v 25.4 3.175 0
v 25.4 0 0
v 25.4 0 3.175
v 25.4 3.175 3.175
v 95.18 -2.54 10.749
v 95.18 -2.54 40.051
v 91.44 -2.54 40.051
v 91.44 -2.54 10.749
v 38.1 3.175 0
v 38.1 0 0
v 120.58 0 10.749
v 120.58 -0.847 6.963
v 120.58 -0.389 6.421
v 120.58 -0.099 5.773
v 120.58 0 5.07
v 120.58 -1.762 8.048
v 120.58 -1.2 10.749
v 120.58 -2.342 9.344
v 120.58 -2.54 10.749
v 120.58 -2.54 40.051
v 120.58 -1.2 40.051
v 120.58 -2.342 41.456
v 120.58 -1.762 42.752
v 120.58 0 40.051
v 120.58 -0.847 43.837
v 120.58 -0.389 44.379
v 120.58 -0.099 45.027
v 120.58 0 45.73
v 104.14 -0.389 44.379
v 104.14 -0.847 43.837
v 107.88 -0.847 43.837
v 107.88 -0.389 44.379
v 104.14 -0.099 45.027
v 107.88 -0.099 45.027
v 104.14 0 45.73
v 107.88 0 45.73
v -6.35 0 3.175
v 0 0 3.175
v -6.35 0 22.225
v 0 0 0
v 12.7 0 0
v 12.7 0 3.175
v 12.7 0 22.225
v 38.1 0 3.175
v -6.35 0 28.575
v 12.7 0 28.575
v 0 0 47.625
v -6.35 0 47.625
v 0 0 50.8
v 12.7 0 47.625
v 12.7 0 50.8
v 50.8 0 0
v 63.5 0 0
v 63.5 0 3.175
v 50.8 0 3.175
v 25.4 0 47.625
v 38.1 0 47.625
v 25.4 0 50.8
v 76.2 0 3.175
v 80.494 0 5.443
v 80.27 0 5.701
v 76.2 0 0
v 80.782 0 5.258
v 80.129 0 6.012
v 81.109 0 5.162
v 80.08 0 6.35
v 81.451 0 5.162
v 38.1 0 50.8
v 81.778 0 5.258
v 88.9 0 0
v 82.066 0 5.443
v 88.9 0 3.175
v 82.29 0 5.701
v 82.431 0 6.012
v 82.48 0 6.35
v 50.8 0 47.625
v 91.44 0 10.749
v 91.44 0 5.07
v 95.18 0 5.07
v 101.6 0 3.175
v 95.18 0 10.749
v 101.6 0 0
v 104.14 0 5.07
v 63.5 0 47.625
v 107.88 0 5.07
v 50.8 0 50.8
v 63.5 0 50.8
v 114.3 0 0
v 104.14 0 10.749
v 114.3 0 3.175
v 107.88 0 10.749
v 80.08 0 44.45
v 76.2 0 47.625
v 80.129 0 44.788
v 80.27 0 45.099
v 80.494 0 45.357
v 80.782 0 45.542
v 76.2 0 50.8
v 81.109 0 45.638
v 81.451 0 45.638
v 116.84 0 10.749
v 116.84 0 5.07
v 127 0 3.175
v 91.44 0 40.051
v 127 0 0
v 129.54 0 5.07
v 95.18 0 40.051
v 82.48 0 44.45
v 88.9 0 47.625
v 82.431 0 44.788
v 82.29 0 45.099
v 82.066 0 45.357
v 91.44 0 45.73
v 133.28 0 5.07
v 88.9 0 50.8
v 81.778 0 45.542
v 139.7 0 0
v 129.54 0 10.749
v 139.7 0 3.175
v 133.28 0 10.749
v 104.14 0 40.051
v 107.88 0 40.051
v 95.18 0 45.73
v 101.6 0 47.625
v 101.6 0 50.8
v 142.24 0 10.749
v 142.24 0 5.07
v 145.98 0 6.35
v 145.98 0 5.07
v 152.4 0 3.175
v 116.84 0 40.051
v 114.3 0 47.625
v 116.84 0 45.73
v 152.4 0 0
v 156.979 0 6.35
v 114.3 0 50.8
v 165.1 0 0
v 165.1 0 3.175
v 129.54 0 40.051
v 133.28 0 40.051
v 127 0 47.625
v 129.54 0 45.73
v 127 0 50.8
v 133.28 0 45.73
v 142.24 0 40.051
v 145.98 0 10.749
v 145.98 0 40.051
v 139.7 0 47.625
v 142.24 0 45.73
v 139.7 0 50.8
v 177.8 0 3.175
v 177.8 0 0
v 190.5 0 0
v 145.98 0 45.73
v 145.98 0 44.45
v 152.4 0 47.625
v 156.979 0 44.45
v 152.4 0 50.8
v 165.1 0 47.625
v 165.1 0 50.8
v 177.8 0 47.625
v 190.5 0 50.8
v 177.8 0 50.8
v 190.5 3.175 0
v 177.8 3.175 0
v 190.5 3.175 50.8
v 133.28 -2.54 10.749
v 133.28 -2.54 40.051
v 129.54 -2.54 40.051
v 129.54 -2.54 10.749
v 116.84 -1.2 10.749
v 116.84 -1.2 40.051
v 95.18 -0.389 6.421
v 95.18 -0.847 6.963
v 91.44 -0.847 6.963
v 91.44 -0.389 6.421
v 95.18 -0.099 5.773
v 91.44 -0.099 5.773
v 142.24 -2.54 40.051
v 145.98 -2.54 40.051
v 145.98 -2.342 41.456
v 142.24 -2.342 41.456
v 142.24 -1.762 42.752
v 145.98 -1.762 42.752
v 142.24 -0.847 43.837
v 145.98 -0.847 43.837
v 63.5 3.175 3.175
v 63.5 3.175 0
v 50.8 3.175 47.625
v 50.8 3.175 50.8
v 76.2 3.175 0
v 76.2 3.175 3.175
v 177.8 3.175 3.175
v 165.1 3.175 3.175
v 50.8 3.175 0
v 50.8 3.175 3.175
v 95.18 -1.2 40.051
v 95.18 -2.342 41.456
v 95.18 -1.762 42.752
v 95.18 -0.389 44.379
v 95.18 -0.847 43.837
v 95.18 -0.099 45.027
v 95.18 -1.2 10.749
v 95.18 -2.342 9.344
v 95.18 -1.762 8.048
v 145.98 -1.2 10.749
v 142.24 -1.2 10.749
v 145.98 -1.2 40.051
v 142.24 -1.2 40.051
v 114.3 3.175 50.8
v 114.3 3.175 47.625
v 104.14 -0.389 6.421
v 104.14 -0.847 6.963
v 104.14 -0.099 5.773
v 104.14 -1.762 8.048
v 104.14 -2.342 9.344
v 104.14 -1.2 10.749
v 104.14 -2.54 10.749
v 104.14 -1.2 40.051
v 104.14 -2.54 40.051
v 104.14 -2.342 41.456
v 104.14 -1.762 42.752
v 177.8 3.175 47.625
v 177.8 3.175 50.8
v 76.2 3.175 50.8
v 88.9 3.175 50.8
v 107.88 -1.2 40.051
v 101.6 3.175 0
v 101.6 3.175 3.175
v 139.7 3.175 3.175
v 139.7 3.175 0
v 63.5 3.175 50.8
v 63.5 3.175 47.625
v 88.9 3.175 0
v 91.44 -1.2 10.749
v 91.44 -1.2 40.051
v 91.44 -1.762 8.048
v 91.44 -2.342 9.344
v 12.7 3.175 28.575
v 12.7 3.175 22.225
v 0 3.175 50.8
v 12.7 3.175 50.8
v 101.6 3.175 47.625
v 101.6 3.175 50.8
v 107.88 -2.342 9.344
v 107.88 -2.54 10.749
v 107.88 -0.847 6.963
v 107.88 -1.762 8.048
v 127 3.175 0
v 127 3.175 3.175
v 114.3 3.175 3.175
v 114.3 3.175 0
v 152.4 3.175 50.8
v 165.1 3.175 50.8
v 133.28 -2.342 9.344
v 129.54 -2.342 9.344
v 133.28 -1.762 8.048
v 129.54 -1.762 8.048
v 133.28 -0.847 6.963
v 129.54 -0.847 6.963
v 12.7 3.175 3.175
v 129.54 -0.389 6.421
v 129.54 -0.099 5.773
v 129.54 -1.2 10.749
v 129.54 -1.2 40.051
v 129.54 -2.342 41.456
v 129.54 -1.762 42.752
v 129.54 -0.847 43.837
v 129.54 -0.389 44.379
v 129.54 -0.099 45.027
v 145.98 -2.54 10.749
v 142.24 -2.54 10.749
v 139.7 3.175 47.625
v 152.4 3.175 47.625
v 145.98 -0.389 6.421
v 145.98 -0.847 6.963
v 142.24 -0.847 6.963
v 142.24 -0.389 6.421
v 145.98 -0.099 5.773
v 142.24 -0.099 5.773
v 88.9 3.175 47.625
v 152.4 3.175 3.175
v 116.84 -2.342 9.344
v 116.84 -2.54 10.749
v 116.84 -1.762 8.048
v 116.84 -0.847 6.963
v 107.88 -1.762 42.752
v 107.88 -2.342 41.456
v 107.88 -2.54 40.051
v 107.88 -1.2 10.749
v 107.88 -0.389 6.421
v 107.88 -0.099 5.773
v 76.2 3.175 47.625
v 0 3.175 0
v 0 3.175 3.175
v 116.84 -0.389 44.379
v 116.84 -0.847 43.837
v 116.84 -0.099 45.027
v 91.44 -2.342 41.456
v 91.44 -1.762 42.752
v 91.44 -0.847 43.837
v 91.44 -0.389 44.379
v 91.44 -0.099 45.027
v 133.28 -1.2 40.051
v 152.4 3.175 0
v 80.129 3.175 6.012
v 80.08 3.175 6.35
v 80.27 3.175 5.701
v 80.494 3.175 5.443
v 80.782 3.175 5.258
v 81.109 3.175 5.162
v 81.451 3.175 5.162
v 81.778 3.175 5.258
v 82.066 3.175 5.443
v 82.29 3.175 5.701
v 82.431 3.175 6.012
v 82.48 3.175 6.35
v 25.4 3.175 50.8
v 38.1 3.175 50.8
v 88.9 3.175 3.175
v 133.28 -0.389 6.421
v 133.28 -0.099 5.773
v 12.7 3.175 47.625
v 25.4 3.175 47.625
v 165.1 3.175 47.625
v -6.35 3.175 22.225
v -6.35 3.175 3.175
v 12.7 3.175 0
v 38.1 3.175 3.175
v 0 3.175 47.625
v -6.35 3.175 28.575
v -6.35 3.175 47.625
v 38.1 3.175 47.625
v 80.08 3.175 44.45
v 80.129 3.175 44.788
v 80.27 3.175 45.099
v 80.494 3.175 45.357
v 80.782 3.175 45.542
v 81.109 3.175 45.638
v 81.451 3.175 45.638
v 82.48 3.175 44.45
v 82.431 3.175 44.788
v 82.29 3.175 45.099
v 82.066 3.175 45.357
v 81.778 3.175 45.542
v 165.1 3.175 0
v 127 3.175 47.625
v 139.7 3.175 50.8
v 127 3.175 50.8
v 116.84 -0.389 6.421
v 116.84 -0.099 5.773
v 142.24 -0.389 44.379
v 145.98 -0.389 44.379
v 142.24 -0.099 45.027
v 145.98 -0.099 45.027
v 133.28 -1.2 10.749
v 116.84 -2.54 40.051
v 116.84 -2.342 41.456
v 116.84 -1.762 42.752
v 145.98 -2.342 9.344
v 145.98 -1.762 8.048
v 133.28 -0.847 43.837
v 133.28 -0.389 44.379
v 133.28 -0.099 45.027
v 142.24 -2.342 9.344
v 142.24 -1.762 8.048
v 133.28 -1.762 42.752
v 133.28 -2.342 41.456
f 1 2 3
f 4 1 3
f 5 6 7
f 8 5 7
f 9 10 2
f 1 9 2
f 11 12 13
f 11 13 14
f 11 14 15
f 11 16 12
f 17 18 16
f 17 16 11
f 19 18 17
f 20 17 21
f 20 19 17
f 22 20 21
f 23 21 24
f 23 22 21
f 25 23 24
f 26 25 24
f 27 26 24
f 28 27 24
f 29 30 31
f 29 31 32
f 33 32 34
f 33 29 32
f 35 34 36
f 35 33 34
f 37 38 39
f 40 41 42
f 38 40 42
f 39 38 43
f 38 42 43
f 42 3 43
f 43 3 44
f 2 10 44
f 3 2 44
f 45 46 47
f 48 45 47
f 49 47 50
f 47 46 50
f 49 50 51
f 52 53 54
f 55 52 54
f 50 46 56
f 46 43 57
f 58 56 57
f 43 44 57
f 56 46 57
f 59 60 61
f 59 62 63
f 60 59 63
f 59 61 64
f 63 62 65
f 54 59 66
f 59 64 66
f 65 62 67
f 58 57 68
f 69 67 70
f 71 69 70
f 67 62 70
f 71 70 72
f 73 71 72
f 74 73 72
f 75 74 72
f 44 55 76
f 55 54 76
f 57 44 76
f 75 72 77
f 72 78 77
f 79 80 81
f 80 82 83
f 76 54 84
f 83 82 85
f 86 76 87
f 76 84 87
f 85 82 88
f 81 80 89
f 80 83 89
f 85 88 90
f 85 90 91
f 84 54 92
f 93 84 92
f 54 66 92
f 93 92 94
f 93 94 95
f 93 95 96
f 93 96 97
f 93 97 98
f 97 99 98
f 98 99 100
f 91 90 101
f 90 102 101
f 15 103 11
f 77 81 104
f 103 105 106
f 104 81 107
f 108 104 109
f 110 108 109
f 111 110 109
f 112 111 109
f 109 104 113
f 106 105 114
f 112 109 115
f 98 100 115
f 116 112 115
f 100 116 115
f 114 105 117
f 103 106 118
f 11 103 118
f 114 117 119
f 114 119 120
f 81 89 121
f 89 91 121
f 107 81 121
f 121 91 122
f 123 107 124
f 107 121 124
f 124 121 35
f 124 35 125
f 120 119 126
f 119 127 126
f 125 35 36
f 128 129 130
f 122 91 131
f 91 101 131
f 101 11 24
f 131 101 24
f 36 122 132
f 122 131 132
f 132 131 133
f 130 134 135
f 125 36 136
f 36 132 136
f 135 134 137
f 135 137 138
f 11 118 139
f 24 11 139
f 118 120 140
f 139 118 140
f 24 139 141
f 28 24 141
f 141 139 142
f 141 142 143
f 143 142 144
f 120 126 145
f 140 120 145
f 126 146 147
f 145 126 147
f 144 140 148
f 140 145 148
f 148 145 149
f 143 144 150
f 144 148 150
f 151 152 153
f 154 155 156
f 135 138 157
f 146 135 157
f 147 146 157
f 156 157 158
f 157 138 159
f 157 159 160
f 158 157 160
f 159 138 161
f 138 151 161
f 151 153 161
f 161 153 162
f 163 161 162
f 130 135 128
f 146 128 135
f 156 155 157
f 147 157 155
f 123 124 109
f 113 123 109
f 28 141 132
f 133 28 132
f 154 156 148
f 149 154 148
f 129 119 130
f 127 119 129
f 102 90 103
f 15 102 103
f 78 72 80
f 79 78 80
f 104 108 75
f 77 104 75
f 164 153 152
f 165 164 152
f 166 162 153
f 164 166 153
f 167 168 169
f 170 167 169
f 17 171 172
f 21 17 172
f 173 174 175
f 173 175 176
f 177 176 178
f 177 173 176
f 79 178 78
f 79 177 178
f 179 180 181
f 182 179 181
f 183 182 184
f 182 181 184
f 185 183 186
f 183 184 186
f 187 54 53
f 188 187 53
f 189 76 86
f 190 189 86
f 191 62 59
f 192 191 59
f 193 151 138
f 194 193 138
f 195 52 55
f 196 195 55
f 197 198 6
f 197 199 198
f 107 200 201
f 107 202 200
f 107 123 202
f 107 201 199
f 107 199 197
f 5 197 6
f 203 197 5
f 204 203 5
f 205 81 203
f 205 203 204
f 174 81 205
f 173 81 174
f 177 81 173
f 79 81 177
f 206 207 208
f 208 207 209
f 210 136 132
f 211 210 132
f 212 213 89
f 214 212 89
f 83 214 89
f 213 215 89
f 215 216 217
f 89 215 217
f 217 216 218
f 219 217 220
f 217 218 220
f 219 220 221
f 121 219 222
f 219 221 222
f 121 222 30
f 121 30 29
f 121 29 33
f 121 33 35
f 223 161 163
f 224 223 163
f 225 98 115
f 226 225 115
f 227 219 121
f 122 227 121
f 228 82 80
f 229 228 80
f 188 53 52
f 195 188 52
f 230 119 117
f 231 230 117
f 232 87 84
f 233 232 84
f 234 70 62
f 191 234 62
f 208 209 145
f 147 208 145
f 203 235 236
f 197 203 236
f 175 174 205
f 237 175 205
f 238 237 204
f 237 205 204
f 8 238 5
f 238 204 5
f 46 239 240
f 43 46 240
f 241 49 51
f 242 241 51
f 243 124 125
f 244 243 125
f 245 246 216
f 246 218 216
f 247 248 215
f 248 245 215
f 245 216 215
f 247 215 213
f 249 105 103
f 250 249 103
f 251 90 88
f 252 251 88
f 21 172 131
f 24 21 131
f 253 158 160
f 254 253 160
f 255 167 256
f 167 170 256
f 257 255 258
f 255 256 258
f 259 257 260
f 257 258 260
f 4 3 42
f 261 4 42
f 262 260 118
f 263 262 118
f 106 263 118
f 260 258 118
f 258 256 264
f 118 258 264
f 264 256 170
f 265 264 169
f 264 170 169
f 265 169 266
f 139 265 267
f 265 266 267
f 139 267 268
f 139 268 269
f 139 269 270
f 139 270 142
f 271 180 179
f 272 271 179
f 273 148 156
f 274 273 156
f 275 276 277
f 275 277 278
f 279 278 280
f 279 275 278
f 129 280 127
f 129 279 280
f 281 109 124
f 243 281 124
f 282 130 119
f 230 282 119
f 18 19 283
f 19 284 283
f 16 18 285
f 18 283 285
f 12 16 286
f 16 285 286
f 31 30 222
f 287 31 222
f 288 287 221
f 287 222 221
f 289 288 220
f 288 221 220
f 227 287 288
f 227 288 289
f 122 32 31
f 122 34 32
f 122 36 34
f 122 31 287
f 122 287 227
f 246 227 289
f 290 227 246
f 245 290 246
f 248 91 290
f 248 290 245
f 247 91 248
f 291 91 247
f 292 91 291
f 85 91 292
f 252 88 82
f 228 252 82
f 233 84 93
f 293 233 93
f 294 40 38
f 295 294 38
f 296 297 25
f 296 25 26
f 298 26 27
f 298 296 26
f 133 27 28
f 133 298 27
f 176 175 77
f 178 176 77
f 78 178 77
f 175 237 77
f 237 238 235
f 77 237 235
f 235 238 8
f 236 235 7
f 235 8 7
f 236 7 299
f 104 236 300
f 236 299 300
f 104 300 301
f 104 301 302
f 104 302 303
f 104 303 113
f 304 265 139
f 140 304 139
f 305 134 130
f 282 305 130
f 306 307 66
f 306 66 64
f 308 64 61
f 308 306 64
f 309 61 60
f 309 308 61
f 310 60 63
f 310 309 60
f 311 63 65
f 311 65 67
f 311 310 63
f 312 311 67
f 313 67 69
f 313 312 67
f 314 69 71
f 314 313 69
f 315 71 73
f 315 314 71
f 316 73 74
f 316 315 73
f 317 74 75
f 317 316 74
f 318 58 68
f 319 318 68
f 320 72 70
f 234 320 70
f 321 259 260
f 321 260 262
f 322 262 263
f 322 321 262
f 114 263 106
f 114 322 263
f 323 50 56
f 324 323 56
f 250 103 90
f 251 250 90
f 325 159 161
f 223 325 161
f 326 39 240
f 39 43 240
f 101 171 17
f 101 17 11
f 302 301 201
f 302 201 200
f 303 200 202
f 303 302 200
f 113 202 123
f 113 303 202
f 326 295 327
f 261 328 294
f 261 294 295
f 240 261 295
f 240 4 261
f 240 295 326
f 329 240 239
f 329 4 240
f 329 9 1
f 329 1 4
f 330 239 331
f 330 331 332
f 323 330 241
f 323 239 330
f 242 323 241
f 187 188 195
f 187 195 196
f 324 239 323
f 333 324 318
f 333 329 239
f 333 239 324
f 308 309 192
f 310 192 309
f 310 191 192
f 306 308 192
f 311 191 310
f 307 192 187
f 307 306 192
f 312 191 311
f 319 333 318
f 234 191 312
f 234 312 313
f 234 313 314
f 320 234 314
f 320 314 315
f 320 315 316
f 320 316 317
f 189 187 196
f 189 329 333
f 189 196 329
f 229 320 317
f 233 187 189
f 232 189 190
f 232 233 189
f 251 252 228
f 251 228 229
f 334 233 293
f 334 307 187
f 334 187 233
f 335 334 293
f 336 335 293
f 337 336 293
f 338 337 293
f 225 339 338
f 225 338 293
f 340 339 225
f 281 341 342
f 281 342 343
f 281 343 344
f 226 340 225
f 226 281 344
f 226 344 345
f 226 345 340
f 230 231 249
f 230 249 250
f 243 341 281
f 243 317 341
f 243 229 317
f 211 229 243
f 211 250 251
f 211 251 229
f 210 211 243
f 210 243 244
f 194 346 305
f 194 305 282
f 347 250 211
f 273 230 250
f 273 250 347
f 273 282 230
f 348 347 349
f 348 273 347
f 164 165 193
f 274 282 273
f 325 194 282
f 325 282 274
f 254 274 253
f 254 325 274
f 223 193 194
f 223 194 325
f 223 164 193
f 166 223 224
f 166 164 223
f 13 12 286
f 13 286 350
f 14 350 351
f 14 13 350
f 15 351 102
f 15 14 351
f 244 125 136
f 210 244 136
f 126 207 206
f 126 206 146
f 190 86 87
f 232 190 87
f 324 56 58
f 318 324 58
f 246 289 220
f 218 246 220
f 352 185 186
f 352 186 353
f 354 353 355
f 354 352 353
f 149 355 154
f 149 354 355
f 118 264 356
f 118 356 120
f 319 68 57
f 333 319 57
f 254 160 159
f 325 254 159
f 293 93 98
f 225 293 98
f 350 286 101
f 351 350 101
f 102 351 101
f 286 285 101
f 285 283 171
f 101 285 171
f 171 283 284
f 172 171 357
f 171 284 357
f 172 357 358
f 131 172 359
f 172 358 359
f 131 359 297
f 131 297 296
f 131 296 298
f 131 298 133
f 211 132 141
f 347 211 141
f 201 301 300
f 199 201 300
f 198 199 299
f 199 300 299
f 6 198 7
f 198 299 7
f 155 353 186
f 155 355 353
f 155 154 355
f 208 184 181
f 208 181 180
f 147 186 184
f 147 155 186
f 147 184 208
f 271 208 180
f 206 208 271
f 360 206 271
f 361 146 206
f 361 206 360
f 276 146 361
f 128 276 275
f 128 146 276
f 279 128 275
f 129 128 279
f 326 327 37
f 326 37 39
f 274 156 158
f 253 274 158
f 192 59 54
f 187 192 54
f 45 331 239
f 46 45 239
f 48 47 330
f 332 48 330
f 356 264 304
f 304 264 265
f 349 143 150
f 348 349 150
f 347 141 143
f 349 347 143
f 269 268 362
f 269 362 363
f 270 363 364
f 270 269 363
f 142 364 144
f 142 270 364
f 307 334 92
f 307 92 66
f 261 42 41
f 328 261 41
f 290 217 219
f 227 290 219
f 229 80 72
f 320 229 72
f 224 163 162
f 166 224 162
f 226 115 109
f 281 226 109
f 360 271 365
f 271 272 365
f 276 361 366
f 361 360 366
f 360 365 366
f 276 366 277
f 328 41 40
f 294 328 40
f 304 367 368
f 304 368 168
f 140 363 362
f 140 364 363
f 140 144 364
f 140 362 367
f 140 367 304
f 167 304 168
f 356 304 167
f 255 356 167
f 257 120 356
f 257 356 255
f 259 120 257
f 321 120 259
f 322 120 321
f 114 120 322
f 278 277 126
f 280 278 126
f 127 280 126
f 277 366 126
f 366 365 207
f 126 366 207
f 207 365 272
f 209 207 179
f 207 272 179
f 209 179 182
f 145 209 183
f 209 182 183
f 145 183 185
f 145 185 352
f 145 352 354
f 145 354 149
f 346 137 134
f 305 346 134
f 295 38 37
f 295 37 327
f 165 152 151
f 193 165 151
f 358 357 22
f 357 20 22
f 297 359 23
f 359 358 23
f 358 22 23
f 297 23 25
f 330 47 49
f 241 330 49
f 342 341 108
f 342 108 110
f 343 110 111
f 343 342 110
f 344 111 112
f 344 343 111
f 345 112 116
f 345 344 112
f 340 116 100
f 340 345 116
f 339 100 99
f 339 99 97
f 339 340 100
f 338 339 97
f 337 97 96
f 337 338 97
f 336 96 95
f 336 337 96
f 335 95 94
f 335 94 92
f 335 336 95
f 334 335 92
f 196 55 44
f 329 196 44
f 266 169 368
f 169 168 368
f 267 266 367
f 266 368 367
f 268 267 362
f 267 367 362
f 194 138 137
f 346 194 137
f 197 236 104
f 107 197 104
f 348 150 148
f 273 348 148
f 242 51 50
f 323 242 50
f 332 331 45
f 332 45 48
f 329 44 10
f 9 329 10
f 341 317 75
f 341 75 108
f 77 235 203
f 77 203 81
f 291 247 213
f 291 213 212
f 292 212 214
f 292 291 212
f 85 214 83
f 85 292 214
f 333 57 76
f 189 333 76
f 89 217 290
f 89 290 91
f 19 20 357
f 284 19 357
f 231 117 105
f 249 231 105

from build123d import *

# Parameters (mm, degrees)
BOSS_EXTRUDE1_DEPTH = 3.175
SKETCH2_W           = 12.7
SKETCH2_H           = 6.35
CUT_EXTRUDE1_DEPTH  = 198.182581951
SKETCH3_W           = 19.05
SKETCH3_H           = 3.175
BOSS_EXTRUDE2_DEPTH = 6.35
CUT_EXTRUDE4_DEPTH  = 3.175
SKETCH6_W           = 3.74
SKETCH6_H           = 38.1
BOSS_EXTRUDE3_DEPTH = 2.54
FILLET1_R           = 5.08
CUT_EXTRUDE5_REACH  = 113.371
SKETCH7_W           = 29.301181898
SKETCH7_H           = 1.2
FILLET3_R           = 2.54


with BuildPart() as part:
    # Sketch1 → Boss-Extrude1 (new body)
    with BuildSketch(Plane(origin=(0, 0, 0), x_dir=(1, 0, 0), z_dir=(0, 1, 0))):
        Polygon((12.7, 0), (0, 0), (0, -50.8), (12.7, -50.8), (12.7, -47.625), (25.4, -47.625), (25.4, -50.8), (38.1, -50.8), (38.1, -47.625), (50.8, -47.625), (50.8, -50.8), (63.5, -50.8), (63.5, -47.625), (76.2, -47.625), (76.2, -50.8), (88.9, -50.8), (88.9, -47.625), (101.6, -47.625), (101.6, -50.8), (114.3, -50.8), (114.3, -47.625), (127, -47.625), (127, -50.8), (139.7, -50.8), (139.7, -47.625), (152.4, -47.625), (152.4, -50.8), (165.1, -50.8), (165.1, -47.625), (177.8, -47.625), (177.8, -50.8), (190.5, -50.8), (190.5, 0), (177.8, 0), (177.8, -3.175), (165.1, -3.175), (165.1, 0), (152.4, 0), (152.4, -3.175), (139.7, -3.175), (139.7, 0), (127, 0), (127, -3.175), (114.3, -3.175), (114.3, 0), (101.6, 0), (101.6, -3.175), (88.9, -3.175), (88.9, 0), (76.2, 0), (76.2, -3.175), (63.5, -3.175), (63.5, 0), (50.8, 0), (50.8, -3.175), (38.1, -3.175), (38.1, 0), (25.4, 0), (25.4, -3.175), (12.7, -3.175), align=None)
    extrude(amount=BOSS_EXTRUDE1_DEPTH)

    # Sketch2 → Cut-Extrude1 (cut, through all)
    with BuildSketch(Plane(origin=(0, 3.175, 0), x_dir=(1, 0, 0), z_dir=(0, 1, 0))):
        with Locations((6.35, -25.4)):
            Rectangle(SKETCH2_W, SKETCH2_H)
    extrude(amount=-CUT_EXTRUDE1_DEPTH, mode=Mode.SUBTRACT)

    # Sketch3 → Boss-Extrude2 (add)
    with BuildSketch(Plane.ZY):
        with Locations((12.7, 1.5875)):
            Rectangle(SKETCH3_W, SKETCH3_H)
        with Locations((38.1, 1.5875)):
            Rectangle(SKETCH3_W, SKETCH3_H)
    extrude(amount=BOSS_EXTRUDE2_DEPTH)

    # Sketch5 → Cut-Extrude4 (cut)
    with BuildSketch(Plane(origin=(0, 3.175, 0), x_dir=(1, 0, 0), z_dir=(0, 1, 0))):
        with BuildLine():
            Line((82.48, -6.35), (82.48, -44.45))
            ThreePointArc((82.48, -44.45), (81.28, -45.65), (80.08, -44.45))
            Line((80.08, -44.45), (80.08, -6.35))
            ThreePointArc((80.08, -6.35), (81.28, -5.15), (82.48, -6.35))
        make_face()
    extrude(amount=-CUT_EXTRUDE4_DEPTH, mode=Mode.SUBTRACT)

    # Sketch6 → Boss-Extrude3 (add)
    with BuildSketch(Plane(origin=(0, 0, 0), x_dir=(-1, 0, 0), z_dir=(0, -1, 0))):
        with Locations((-106.01, -25.4)):
            Rectangle(SKETCH6_W, SKETCH6_H)
        with Locations((-93.31, -25.4)):
            Rectangle(SKETCH6_W, SKETCH6_H)
        with Locations((-118.71, -25.4)):
            Rectangle(SKETCH6_W, SKETCH6_H)
        with Locations((-131.41, -25.4)):
            Rectangle(SKETCH6_W, SKETCH6_H)
        with Locations((-144.11, -25.4)):
            Rectangle(SKETCH6_W, SKETCH6_H)
    extrude(amount=BOSS_EXTRUDE3_DEPTH)

    # Fillet1
    # the kernel refuses this fillet: 5.08 mm, written as the material it takes off along each edge
    with BuildSketch(Plane(origin=(106.178522628, -2.54, 6.35), x_dir=(0, 1, 0), z_dir=(-1, 0, 0)), Plane(origin=(80.441477372, -2.54, 44.45), x_dir=(0, 1, 0), z_dir=(1, 0, 0))) as fillet1_piece_1:
        with BuildLine():
            CenterArc((5.08, -4.399409051), FILLET1_R, 120, 60)
            Line((0, -4.399409051), (-0.1016, -4.399409051))
            Line((-0.1016, -4.399409051), (-0.1016, 0))
            Line((-0.1016, 0), (0, 0.1016))
            ThreePointArc((0, 0.1016), (1.27, 0.1016), (2.4892, 0.087988181))
            Line((2.4892, 0.087988181), (2.54, 0))
        make_face()
    extrude(amount=25.737045256, mode=Mode.SUBTRACT)
    with BuildSketch(Plane(origin=(93.141477372, -2.54, 6.35), x_dir=(0, 1, 0), z_dir=(1, 0, 0)), Plane(origin=(105.841477372, -2.54, 6.35), x_dir=(0, 1, 0), z_dir=(1, 0, 0)), Plane(origin=(118.541477372, -2.54, 6.35), x_dir=(0, 1, 0), z_dir=(1, 0, 0)), Plane(origin=(131.241477372, -2.54, 6.35), x_dir=(0, 1, 0), z_dir=(1, 0, 0)), Plane(origin=(156.978522628, -2.54, 44.45), x_dir=(0, 1, 0), z_dir=(-1, 0, 0)), Plane(origin=(144.278522628, -2.54, 44.45), x_dir=(0, 1, 0), z_dir=(-1, 0, 0)), Plane(origin=(131.578522628, -2.54, 44.45), x_dir=(0, 1, 0), z_dir=(-1, 0, 0)), Plane(origin=(118.878522628, -2.54, 44.45), x_dir=(0, 1, 0), z_dir=(-1, 0, 0))) as fillet1_piece_2:
        with BuildLine():
            CenterArc((5.08, 4.399409051), FILLET1_R, 180, 60)
            Line((0, 4.399409051), (-0.1016, 4.399409051))
            Line((-0.1016, 4.399409051), (-0.1016, 0))
            Line((-0.1016, 0), (0, -0.1016))
            ThreePointArc((0, -0.1016), (1.27, -0.1016), (2.4892, -0.087988181))
            Line((2.4892, -0.087988181), (2.54, 0))
        make_face()
    extrude(amount=25.737045256, mode=Mode.SUBTRACT)

    # Cut-Extrude5: up to this face of the body (flat: up to its plane)
    cut_extrude5_end = Plane(part.part.faces().sort_by_distance((145.98, -1.229881831, 25.4))[0])
    # Sketch7 → Cut-Extrude5 (cut, up to the picked face)
    with BuildSketch(Plane.ZY.offset(-91.44), mode=Mode.PRIVATE) as cut_extrude5_sk1:
        with Locations((25.4, -0.6)):
            Rectangle(SKETCH7_W, SKETCH7_H)
    cut_extrude5_tool1 = split(extrude(cut_extrude5_sk1.sketch, amount=-CUT_EXTRUDE5_REACH, mode=Mode.PRIVATE), bisect_by=cut_extrude5_end, keep=Keep.BOTH, mode=Mode.PRIVATE)
    add(cut_extrude5_tool1.solids().sort_by(Axis((91.44, -0.6, 25.4), (1, 0, 0)))[0], mode=Mode.SUBTRACT)

    # Fillet3
    # the kernel refuses this fillet: 2.54 mm, written as the material it adds along each edge
    with BuildSketch(Plane(origin=(120.58, 0, 6.35), x_dir=(0, 0, -1), z_dir=(-1, 0, 0)), Plane(origin=(116.84, 0, 44.45), x_dir=(0, 0, 1), z_dir=(1, 0, 0)), Plane(origin=(107.88, 0, 6.35), x_dir=(0, 0, -1), z_dir=(-1, 0, 0)), Plane(origin=(104.14, 0, 44.45), x_dir=(0, 0, 1), z_dir=(1, 0, 0)), Plane(origin=(95.18, 0, 6.35), x_dir=(0, 0, -1), z_dir=(-1, 0, 0)), Plane(origin=(91.44, 0, 44.45), x_dir=(0, 0, 1), z_dir=(1, 0, 0)), Plane(origin=(145.98, 0, 6.35), x_dir=(0, 0, -1), z_dir=(-1, 0, 0)), Plane(origin=(142.24, 0, 44.45), x_dir=(0, 0, 1), z_dir=(1, 0, 0)), Plane(origin=(133.28, 0, 6.35), x_dir=(0, 0, -1), z_dir=(-1, 0, 0)), Plane(origin=(129.54, 0, 44.45), x_dir=(0, 0, 1), z_dir=(1, 0, 0))) as fillet3_piece_1:
        with BuildLine():
            CenterArc((1.280203612, 2.54), FILLET3_R, 221.810314896, 48.189685104)
            ThreePointArc((-0.613000609, 0.846666667), (-0.284665667, 0.439141971), (0, 0))
            Line((0, 0), (1.280203612, 0))
        make_face()
    extrude(amount=3.74)


solid = part.part
